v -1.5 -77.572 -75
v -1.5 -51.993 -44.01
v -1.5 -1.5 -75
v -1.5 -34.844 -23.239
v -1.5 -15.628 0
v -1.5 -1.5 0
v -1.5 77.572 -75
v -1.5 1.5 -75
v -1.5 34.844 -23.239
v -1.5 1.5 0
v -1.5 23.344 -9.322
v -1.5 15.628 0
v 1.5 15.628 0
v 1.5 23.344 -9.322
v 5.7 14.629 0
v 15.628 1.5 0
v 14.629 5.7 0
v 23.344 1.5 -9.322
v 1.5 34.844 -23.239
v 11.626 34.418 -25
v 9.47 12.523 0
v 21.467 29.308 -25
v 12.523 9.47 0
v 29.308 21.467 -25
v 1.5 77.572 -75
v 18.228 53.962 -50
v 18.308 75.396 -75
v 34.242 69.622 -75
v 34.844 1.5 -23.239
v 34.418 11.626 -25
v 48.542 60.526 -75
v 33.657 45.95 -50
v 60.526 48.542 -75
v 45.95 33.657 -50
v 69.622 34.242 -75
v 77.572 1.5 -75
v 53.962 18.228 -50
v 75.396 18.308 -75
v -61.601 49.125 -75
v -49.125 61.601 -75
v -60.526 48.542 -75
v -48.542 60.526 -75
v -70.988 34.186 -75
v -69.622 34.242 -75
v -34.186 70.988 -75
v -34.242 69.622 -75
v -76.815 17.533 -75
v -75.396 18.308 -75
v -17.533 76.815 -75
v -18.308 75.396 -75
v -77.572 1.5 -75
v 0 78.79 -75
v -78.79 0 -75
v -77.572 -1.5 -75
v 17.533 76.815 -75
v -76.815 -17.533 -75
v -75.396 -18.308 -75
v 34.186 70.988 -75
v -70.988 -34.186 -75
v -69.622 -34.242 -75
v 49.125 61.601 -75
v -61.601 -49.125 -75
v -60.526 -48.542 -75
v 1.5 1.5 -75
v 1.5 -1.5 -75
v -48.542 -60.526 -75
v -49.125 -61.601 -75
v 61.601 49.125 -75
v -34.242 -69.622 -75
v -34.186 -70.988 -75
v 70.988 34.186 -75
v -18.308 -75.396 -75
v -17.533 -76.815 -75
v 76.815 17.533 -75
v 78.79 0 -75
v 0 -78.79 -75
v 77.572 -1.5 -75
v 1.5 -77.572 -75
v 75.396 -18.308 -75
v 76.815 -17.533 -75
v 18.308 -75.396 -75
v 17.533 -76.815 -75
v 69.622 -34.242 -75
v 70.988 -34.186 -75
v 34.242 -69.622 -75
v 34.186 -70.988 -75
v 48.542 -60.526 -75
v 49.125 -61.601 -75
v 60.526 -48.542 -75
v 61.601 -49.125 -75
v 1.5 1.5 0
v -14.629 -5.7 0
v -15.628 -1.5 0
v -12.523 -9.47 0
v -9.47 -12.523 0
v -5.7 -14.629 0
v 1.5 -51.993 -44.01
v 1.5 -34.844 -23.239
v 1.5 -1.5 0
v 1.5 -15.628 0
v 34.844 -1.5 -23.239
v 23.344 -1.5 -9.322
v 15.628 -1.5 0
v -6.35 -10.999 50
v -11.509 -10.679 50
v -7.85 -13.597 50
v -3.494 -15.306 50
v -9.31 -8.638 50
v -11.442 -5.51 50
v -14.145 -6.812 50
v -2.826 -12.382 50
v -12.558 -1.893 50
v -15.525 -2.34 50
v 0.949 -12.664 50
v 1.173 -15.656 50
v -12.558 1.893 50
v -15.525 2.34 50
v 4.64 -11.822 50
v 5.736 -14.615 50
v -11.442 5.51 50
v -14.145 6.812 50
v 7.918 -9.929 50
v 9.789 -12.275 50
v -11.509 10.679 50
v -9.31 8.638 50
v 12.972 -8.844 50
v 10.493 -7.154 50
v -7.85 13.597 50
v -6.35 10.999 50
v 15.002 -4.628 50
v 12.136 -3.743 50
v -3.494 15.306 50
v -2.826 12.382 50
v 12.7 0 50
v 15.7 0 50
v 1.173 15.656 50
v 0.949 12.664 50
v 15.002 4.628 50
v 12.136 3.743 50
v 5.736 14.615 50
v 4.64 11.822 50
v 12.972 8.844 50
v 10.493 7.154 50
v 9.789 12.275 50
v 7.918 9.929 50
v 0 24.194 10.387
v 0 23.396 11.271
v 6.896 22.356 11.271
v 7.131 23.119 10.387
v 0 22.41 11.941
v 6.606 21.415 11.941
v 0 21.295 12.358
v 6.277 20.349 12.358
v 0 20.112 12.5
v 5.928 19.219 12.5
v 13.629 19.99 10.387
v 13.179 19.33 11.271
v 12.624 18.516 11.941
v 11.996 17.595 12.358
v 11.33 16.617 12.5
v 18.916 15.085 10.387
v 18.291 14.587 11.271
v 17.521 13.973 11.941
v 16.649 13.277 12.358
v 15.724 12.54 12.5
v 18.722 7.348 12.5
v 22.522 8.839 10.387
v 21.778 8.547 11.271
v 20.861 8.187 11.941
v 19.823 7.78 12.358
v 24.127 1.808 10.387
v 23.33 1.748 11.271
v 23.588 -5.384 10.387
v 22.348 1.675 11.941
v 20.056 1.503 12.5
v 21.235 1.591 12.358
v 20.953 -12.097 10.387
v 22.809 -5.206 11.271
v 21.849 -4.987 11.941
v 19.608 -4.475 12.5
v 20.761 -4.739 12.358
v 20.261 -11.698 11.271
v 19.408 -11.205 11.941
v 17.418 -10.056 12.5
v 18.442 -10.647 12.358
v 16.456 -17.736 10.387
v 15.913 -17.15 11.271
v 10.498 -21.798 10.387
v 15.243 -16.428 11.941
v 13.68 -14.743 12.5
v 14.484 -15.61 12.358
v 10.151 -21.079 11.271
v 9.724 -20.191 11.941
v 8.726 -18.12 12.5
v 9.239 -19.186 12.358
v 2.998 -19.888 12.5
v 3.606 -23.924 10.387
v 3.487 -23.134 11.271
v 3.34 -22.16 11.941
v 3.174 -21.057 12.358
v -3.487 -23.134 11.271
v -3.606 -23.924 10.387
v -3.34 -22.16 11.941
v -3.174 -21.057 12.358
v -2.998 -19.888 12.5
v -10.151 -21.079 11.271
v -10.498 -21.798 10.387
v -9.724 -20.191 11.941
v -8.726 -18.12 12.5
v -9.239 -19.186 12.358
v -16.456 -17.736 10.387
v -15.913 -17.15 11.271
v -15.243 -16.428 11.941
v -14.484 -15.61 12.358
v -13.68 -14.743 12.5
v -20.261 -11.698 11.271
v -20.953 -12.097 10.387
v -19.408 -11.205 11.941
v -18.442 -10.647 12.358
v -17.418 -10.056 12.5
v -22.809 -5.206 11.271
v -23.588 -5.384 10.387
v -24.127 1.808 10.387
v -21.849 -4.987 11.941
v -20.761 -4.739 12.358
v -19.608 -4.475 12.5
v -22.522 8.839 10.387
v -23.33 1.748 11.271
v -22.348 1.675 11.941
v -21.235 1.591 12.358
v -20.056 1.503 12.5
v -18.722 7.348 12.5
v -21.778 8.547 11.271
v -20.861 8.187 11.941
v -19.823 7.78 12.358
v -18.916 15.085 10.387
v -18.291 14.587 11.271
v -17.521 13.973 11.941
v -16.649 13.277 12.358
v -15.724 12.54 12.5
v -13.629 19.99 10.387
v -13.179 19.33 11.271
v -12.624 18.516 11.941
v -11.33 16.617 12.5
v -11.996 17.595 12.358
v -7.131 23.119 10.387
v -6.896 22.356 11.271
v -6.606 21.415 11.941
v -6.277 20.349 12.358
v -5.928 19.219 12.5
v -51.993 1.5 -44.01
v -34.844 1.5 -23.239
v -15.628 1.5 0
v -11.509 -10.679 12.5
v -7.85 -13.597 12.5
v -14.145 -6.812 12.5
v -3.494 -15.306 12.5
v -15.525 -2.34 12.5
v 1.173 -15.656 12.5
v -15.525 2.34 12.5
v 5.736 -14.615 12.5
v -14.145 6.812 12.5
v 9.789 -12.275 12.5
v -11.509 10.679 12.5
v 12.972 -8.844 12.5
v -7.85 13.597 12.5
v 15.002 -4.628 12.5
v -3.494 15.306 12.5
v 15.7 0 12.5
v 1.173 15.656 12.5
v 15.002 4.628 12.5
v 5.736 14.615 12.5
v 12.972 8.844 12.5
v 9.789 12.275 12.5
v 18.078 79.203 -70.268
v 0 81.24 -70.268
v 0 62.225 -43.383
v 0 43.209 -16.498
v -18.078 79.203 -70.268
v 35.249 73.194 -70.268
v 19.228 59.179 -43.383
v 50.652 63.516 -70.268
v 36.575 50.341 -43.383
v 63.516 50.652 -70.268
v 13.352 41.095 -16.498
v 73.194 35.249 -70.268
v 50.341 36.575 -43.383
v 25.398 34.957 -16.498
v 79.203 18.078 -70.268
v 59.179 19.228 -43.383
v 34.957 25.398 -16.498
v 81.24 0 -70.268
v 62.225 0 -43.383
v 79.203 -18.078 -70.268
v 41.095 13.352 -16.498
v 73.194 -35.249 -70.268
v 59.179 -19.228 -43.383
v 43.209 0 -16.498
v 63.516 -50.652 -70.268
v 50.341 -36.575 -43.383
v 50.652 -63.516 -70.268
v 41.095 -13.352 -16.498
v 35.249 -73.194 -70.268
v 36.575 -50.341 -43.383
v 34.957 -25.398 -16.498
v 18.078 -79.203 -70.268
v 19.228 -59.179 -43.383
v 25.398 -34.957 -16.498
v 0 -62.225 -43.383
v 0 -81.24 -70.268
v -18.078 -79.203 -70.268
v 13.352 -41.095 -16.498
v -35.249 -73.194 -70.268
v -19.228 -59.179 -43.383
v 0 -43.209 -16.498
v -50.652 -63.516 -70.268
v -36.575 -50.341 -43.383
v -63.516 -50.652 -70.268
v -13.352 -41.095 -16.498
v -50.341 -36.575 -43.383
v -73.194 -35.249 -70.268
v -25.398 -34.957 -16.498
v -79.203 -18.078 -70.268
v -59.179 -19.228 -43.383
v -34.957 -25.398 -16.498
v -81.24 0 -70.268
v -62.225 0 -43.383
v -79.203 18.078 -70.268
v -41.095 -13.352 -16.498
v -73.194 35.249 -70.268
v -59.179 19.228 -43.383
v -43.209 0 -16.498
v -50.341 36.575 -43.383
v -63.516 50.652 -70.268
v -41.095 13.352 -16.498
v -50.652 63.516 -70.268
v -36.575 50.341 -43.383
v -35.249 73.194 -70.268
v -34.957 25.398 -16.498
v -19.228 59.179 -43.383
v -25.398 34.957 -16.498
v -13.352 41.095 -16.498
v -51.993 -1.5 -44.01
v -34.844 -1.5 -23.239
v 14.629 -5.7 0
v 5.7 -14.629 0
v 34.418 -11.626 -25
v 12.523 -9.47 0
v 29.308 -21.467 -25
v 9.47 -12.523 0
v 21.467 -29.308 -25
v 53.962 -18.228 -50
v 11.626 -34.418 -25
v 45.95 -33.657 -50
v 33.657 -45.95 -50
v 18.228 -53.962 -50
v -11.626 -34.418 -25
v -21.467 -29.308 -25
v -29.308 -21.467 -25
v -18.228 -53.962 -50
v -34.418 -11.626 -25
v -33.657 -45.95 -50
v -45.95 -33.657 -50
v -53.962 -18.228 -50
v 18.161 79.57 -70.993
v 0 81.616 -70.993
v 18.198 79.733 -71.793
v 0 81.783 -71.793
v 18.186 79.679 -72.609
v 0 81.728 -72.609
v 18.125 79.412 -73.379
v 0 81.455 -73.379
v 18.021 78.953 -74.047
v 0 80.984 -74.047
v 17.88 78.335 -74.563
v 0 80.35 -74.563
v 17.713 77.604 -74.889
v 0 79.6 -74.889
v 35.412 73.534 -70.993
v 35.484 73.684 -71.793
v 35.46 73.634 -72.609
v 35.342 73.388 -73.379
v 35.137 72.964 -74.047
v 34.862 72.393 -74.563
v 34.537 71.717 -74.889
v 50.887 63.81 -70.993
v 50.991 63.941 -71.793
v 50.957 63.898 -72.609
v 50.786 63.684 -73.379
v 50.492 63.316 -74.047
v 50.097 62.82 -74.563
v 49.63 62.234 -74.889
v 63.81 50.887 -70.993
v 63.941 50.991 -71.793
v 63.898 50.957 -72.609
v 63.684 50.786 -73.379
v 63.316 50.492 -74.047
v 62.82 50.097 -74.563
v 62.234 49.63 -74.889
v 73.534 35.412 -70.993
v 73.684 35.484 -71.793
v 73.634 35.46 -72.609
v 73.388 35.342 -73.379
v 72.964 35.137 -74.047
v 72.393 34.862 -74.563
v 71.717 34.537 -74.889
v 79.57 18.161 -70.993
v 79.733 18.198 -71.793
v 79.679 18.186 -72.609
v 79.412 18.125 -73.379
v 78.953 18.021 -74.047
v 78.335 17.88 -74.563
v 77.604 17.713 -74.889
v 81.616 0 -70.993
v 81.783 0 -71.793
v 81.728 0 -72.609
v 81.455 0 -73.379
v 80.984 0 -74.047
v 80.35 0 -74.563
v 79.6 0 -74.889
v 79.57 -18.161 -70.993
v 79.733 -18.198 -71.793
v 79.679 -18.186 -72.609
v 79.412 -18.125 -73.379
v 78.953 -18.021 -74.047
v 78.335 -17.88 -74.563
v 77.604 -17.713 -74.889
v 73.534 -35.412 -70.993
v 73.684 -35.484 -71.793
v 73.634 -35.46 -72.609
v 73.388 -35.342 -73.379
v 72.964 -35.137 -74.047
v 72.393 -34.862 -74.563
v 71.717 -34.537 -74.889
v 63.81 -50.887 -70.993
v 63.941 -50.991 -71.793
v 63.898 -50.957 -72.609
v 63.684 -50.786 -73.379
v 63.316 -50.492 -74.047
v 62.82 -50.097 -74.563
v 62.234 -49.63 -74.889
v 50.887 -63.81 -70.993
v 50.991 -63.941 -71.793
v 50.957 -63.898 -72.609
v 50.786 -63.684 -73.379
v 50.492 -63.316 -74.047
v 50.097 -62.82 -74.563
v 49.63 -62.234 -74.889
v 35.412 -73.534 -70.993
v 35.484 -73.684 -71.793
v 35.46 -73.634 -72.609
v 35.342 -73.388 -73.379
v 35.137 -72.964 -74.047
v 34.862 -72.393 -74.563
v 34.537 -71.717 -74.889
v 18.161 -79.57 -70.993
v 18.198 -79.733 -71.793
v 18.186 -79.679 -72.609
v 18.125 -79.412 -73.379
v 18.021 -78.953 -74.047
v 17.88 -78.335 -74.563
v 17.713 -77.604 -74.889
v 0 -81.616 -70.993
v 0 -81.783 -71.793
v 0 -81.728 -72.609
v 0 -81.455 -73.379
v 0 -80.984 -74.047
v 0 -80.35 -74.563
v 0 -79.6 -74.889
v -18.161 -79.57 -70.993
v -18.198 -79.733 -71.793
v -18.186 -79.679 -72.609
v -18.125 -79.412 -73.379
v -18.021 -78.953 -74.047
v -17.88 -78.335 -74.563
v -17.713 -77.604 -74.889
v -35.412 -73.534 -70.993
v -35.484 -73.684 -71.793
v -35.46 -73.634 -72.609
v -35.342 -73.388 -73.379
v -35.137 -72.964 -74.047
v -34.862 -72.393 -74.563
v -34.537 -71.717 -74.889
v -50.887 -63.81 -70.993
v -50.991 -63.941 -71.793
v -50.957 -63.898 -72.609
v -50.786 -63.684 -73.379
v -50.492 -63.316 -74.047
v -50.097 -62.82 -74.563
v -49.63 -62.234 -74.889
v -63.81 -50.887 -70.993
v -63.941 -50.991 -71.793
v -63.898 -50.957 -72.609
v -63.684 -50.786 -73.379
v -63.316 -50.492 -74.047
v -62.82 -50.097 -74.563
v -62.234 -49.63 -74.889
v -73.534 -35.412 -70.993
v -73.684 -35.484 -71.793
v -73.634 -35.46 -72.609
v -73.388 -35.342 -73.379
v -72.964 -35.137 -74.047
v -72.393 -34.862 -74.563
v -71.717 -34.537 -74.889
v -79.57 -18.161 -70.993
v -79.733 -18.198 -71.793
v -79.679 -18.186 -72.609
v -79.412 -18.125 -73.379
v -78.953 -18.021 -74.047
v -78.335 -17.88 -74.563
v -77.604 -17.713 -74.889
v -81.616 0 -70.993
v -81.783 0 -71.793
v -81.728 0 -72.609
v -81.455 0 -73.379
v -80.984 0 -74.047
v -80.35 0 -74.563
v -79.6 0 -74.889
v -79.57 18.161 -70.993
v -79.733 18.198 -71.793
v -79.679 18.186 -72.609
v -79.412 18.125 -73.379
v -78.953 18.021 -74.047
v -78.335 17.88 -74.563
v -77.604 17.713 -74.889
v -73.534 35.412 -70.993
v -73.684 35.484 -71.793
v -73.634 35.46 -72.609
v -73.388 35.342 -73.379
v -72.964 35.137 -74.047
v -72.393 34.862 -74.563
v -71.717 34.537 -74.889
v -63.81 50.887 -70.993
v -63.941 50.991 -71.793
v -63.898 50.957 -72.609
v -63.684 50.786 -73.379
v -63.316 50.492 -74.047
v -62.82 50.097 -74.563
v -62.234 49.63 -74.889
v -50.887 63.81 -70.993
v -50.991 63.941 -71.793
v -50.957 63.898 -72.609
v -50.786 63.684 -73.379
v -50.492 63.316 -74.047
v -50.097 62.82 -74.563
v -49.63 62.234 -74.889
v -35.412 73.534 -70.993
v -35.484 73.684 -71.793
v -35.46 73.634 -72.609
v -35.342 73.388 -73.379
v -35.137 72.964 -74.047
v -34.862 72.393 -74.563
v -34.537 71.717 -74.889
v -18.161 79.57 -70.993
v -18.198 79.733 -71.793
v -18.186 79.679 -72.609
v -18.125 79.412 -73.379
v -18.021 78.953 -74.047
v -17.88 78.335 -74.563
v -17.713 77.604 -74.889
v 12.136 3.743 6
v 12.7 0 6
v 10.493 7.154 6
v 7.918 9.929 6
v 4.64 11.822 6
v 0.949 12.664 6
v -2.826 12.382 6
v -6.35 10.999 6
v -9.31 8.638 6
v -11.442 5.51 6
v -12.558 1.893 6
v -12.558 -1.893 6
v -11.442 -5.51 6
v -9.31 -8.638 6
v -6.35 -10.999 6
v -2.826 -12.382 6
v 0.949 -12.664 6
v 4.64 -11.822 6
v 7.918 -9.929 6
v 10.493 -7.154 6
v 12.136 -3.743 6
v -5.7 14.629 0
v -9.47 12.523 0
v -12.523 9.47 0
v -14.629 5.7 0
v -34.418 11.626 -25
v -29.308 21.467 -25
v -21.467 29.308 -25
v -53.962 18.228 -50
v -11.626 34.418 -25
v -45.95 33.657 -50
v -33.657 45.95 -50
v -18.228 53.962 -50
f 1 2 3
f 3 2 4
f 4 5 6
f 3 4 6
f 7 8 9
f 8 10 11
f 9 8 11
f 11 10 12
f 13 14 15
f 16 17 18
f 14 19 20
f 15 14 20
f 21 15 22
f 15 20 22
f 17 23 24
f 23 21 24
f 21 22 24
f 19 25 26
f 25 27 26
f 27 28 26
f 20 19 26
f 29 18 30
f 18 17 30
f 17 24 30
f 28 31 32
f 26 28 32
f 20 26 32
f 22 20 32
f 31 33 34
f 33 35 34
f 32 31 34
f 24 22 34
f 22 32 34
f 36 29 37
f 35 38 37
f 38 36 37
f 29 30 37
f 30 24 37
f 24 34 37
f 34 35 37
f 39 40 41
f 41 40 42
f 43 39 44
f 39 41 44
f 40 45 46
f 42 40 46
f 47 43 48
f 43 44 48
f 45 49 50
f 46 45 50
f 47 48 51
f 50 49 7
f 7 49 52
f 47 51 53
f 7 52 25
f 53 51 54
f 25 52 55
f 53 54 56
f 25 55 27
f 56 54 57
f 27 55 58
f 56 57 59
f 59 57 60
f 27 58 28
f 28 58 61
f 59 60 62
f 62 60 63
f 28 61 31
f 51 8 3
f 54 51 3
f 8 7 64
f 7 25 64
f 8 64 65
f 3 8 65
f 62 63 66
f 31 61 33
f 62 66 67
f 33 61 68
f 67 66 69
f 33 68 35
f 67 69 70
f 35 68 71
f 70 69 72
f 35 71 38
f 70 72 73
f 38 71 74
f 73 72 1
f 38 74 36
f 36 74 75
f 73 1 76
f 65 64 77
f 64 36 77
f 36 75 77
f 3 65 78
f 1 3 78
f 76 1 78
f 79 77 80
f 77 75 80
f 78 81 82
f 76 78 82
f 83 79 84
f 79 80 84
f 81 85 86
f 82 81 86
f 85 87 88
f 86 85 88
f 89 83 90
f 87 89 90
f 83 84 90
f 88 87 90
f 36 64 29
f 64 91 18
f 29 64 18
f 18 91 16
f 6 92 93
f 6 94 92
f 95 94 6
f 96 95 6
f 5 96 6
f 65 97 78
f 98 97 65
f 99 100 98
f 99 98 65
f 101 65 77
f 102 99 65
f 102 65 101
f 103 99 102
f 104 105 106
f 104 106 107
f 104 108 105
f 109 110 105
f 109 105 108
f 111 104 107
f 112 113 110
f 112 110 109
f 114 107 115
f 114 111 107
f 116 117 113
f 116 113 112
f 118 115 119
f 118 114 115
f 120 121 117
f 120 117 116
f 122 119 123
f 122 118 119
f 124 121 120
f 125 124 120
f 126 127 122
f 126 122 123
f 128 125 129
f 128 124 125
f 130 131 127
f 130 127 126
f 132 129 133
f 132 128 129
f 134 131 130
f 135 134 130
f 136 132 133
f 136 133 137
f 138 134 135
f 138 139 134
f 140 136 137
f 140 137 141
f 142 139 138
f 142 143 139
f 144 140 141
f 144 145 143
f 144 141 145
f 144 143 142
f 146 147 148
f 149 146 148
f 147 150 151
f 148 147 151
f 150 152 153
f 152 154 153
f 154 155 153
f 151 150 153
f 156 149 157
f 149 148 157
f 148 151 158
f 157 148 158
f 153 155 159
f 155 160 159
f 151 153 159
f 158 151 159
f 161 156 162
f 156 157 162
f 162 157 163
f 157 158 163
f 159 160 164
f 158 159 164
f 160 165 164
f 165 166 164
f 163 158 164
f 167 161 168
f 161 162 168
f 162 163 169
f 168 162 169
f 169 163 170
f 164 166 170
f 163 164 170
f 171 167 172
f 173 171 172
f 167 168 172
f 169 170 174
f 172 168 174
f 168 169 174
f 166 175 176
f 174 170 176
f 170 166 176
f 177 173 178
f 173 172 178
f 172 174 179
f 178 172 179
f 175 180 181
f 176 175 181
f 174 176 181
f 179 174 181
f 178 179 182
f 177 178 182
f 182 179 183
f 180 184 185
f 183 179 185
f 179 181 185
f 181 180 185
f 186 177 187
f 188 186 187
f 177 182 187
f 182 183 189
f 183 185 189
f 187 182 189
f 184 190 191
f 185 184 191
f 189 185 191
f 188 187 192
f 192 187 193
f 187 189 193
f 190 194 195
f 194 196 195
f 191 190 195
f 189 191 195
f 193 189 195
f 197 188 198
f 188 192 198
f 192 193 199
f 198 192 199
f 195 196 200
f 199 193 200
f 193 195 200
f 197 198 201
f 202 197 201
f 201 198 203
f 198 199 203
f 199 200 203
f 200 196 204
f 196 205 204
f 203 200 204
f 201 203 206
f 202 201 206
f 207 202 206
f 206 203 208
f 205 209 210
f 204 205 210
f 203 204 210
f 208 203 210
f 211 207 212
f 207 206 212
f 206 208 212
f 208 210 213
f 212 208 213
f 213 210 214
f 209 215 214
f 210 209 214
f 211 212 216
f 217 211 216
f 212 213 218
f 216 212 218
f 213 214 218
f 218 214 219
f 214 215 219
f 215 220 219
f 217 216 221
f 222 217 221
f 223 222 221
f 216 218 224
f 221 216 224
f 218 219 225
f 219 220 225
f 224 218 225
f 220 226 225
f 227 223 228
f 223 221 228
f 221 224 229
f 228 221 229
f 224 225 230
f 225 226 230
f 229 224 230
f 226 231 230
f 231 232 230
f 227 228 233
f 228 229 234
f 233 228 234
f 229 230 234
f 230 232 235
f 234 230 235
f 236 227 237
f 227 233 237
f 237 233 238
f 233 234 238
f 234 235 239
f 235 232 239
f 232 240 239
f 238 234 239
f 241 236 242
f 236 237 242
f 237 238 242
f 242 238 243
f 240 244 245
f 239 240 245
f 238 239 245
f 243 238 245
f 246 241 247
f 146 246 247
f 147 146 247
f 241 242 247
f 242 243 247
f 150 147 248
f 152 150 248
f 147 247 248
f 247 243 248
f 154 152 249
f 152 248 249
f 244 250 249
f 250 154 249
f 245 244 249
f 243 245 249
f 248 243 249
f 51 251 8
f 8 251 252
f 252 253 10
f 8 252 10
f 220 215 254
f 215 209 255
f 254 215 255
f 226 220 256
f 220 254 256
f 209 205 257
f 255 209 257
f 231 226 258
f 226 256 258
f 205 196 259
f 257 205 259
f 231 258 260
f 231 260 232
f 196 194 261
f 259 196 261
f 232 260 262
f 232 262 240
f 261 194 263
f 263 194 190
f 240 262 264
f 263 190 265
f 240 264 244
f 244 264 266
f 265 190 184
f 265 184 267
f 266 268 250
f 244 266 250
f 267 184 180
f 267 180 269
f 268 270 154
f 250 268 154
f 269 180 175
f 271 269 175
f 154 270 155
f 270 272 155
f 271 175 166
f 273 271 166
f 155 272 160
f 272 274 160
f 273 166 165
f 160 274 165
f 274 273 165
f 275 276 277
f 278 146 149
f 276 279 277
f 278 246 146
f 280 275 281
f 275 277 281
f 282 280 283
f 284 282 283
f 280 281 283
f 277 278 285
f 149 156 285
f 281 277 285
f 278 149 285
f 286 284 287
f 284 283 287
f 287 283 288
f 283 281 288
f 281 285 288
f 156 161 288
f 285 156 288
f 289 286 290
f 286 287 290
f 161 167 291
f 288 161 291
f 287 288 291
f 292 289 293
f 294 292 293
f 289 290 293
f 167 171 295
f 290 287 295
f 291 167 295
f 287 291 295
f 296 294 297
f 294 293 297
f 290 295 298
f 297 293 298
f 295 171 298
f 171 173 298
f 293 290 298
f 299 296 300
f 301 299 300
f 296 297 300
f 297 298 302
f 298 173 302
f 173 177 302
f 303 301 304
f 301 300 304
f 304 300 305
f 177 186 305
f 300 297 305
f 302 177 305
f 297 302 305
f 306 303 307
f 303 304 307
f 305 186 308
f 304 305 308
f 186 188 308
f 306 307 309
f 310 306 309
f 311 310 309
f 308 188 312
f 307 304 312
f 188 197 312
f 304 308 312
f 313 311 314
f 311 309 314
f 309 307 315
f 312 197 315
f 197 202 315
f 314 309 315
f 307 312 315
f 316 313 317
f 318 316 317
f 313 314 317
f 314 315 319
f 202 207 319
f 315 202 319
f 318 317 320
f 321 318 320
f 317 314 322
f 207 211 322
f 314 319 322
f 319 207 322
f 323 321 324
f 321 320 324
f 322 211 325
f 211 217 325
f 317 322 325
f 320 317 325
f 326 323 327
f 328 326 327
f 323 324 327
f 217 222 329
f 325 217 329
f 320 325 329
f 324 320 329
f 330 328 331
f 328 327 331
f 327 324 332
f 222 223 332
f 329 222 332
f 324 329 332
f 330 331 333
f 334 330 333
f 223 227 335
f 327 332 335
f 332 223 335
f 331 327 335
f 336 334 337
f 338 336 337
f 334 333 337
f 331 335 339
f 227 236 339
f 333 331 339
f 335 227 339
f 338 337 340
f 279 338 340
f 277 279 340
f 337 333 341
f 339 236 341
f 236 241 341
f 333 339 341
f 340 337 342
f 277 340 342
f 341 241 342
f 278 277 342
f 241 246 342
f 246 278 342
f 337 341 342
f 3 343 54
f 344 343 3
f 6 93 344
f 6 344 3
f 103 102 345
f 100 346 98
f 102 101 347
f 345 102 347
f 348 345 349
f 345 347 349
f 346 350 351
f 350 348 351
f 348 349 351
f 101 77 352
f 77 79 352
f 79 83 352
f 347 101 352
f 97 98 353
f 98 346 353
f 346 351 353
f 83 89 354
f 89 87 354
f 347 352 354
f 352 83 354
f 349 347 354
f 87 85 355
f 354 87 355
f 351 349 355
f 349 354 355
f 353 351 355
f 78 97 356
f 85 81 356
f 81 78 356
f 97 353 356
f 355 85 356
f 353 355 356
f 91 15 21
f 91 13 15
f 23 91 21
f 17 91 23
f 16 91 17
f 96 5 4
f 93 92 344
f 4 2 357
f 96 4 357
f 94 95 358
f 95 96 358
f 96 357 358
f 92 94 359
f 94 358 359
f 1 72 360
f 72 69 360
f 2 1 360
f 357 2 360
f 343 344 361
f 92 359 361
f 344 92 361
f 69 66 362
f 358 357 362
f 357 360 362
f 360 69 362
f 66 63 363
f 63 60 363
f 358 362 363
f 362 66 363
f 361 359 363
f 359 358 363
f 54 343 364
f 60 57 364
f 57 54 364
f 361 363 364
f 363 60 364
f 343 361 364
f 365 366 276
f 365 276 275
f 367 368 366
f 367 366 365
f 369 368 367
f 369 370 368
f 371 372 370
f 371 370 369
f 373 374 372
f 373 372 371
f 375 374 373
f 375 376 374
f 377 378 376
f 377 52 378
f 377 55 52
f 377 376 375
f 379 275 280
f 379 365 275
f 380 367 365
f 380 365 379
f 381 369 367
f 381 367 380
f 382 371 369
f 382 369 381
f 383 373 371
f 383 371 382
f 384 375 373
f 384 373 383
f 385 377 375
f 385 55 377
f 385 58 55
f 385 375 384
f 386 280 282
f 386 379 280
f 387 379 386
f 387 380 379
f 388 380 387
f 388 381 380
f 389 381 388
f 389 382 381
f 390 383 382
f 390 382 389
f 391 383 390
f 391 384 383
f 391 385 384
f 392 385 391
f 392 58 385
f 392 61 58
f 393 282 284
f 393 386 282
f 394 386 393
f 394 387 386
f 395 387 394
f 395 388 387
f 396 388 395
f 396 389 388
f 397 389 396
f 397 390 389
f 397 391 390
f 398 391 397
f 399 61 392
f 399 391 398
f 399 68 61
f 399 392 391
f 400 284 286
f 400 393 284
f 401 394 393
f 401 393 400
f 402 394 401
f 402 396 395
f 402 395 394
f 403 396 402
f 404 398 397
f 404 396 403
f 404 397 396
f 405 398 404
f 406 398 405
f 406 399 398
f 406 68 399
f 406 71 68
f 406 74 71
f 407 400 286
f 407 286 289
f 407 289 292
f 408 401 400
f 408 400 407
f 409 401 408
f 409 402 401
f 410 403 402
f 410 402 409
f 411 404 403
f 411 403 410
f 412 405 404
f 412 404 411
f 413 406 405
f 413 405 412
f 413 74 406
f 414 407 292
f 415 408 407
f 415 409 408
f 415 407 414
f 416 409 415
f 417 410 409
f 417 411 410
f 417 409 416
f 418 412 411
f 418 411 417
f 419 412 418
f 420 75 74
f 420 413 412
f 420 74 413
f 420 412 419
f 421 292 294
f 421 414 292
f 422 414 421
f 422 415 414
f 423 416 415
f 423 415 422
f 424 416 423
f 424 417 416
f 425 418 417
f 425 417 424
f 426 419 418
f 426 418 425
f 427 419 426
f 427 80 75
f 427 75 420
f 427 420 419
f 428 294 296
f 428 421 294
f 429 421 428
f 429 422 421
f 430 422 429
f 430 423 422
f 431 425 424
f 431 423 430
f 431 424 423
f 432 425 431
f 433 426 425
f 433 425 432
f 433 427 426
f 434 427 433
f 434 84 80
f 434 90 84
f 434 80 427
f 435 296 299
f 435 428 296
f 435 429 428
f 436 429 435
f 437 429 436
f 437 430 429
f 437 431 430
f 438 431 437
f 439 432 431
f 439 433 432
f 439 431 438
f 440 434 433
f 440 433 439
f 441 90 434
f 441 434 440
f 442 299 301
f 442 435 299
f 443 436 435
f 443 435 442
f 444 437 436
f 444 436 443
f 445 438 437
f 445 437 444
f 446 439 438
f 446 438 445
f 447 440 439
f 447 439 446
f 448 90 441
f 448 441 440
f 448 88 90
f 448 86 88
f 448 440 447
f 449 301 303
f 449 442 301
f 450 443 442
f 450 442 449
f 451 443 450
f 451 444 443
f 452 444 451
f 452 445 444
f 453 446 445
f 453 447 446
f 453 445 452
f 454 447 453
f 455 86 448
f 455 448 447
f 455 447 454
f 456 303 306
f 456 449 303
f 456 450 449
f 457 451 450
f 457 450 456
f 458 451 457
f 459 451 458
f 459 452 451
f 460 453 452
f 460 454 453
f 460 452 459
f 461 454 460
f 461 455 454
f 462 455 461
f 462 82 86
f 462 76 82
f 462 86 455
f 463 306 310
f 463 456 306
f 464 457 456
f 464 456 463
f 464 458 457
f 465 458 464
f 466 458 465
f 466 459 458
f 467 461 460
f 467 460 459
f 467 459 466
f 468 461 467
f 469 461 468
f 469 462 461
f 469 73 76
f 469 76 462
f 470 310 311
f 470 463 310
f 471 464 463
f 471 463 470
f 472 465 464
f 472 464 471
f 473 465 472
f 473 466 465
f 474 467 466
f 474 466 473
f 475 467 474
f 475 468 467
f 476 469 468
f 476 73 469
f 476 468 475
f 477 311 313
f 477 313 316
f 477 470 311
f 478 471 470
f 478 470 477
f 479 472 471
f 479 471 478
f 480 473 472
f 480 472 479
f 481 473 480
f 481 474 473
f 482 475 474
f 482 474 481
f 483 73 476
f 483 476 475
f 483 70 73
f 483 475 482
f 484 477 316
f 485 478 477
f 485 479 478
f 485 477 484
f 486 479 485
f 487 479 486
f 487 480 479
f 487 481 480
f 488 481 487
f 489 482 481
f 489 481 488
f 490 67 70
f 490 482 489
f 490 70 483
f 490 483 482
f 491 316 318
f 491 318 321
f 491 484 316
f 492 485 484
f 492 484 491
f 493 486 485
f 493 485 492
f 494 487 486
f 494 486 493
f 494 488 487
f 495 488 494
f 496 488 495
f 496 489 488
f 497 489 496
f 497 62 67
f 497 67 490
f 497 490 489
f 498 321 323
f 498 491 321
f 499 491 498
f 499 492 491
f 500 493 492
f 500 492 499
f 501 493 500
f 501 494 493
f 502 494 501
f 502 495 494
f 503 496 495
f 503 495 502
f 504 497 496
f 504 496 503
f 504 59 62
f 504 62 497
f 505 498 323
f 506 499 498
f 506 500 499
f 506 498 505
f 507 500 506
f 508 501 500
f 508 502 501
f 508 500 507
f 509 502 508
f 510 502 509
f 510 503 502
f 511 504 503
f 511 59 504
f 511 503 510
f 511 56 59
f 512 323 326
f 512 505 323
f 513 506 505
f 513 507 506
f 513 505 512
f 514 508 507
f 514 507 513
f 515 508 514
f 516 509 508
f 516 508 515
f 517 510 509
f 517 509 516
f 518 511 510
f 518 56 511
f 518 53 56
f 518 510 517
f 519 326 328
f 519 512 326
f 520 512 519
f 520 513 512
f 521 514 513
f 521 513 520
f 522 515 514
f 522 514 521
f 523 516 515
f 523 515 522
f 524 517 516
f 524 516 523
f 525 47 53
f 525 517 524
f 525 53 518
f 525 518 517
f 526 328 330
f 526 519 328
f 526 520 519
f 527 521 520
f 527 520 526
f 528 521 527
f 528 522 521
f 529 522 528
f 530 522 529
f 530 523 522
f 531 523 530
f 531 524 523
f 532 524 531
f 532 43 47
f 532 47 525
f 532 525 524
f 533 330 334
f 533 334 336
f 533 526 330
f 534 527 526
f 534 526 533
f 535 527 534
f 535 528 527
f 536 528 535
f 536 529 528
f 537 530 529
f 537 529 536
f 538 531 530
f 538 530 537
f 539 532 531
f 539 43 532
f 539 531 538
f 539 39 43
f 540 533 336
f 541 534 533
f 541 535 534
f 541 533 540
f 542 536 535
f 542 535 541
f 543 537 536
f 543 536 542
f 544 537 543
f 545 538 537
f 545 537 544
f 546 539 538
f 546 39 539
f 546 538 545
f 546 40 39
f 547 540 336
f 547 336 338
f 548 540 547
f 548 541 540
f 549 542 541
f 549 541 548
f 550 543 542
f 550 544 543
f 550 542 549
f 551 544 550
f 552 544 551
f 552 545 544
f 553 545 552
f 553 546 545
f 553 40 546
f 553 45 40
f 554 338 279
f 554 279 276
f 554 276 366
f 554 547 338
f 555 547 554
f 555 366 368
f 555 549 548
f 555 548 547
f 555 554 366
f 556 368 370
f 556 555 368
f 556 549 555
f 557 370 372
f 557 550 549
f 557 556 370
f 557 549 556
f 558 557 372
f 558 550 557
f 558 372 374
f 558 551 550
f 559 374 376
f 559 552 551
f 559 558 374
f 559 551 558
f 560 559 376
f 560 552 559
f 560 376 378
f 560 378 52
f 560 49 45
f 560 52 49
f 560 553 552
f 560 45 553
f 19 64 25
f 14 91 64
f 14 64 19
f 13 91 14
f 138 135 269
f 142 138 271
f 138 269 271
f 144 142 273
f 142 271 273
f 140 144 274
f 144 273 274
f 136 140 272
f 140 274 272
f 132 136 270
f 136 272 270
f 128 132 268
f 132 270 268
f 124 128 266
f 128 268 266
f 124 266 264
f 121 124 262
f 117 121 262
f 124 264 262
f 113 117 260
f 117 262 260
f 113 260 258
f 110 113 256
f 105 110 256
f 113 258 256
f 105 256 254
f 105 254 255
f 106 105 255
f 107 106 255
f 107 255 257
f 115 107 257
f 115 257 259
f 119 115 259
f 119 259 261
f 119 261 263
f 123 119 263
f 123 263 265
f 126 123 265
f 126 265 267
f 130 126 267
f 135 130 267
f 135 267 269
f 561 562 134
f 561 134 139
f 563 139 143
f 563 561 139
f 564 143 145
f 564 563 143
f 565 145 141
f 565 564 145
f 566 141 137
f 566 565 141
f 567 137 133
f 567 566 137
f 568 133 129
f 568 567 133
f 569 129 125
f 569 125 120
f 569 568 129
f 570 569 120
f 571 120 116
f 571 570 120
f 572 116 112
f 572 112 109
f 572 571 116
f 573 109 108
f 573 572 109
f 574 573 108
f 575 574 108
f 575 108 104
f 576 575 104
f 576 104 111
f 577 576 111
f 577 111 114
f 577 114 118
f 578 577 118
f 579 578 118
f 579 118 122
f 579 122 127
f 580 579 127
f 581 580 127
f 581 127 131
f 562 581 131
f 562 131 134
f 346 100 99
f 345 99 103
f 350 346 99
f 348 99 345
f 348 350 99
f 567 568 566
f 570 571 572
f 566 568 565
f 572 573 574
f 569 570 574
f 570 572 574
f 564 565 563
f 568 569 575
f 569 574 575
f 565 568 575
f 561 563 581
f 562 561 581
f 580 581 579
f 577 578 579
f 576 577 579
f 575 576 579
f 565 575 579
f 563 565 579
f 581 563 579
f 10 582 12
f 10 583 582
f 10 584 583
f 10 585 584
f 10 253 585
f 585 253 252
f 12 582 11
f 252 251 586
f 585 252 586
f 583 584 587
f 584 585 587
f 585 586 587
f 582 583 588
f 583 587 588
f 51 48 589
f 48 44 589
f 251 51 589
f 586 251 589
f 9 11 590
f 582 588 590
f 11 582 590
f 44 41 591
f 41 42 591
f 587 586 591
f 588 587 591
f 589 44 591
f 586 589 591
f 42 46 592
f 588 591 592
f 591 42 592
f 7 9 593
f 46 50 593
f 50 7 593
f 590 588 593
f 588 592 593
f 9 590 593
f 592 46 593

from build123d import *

# Parameters (mm, degrees)
F0_R     = 15.7
F0_R_2   = 12.7
F1_DEPTH = 50
F4_R     = 12.7
F5_DEPTH = 6
F7_DEPTH = 1.5
F9_DEPTH = 1.5
F10_R    = 5
F11_R    = 3


with BuildPart() as f1:
    # F0 (on Top) → F1 (new body)
    with BuildSketch(Plane.XY):
        Circle(F0_R)
        Circle(F0_R_2, mode=Mode.SUBTRACT)
    extrude(amount=F1_DEPTH)

    # F2 (on Right) → F3 (revolve)
    with BuildSketch(Plane.YZ):
        Polygon((22.7, 12.5), (15.7, 12.5), (15.7, 0), (77.5868, -75), (84.5868, -75), align=None)
    revolve(axis=Axis((0, 0, -38.817684), (0, 0, -1)))

    # F4 (on face) → F5 (join)
    with BuildSketch(Plane(origin=(0, 0, 0), x_dir=(1, 0, 0), z_dir=(0, 0, -1))):
        Circle(F4_R)
    extrude(amount=-F5_DEPTH)

    # F6 (on Right) → F7 (join, symmetric)
    with BuildSketch(Plane.YZ):
        Polygon((77.5868, -75), (15.7, 0), (0, 0), (-15.7, 0), (-77.5868, -75), (0, -75), align=None)
    extrude(amount=F7_DEPTH, both=True)

    # F8 (on Front) → F9 (join, symmetric)
    with BuildSketch(Plane.XZ):
        Polygon((77.5868, -75), (15.7, 0), (-15.7, 0), (-77.5868, -75), (0, -75), align=None)
    extrude(amount=F9_DEPTH, both=True)

    # F10
    f10_edges = [f1.edges().sort_by_distance(p)[0] for p in [
        (0, -22.7, 12.5),
    ]]
    fillet(f10_edges, radius=F10_R)

    # F11
    f11_edges = [f1.edges().sort_by_distance(p)[0] for p in [
        (0, -84.5868, -75),
    ]]
    fillet(f11_edges, radius=F11_R)


solid = f1.part
